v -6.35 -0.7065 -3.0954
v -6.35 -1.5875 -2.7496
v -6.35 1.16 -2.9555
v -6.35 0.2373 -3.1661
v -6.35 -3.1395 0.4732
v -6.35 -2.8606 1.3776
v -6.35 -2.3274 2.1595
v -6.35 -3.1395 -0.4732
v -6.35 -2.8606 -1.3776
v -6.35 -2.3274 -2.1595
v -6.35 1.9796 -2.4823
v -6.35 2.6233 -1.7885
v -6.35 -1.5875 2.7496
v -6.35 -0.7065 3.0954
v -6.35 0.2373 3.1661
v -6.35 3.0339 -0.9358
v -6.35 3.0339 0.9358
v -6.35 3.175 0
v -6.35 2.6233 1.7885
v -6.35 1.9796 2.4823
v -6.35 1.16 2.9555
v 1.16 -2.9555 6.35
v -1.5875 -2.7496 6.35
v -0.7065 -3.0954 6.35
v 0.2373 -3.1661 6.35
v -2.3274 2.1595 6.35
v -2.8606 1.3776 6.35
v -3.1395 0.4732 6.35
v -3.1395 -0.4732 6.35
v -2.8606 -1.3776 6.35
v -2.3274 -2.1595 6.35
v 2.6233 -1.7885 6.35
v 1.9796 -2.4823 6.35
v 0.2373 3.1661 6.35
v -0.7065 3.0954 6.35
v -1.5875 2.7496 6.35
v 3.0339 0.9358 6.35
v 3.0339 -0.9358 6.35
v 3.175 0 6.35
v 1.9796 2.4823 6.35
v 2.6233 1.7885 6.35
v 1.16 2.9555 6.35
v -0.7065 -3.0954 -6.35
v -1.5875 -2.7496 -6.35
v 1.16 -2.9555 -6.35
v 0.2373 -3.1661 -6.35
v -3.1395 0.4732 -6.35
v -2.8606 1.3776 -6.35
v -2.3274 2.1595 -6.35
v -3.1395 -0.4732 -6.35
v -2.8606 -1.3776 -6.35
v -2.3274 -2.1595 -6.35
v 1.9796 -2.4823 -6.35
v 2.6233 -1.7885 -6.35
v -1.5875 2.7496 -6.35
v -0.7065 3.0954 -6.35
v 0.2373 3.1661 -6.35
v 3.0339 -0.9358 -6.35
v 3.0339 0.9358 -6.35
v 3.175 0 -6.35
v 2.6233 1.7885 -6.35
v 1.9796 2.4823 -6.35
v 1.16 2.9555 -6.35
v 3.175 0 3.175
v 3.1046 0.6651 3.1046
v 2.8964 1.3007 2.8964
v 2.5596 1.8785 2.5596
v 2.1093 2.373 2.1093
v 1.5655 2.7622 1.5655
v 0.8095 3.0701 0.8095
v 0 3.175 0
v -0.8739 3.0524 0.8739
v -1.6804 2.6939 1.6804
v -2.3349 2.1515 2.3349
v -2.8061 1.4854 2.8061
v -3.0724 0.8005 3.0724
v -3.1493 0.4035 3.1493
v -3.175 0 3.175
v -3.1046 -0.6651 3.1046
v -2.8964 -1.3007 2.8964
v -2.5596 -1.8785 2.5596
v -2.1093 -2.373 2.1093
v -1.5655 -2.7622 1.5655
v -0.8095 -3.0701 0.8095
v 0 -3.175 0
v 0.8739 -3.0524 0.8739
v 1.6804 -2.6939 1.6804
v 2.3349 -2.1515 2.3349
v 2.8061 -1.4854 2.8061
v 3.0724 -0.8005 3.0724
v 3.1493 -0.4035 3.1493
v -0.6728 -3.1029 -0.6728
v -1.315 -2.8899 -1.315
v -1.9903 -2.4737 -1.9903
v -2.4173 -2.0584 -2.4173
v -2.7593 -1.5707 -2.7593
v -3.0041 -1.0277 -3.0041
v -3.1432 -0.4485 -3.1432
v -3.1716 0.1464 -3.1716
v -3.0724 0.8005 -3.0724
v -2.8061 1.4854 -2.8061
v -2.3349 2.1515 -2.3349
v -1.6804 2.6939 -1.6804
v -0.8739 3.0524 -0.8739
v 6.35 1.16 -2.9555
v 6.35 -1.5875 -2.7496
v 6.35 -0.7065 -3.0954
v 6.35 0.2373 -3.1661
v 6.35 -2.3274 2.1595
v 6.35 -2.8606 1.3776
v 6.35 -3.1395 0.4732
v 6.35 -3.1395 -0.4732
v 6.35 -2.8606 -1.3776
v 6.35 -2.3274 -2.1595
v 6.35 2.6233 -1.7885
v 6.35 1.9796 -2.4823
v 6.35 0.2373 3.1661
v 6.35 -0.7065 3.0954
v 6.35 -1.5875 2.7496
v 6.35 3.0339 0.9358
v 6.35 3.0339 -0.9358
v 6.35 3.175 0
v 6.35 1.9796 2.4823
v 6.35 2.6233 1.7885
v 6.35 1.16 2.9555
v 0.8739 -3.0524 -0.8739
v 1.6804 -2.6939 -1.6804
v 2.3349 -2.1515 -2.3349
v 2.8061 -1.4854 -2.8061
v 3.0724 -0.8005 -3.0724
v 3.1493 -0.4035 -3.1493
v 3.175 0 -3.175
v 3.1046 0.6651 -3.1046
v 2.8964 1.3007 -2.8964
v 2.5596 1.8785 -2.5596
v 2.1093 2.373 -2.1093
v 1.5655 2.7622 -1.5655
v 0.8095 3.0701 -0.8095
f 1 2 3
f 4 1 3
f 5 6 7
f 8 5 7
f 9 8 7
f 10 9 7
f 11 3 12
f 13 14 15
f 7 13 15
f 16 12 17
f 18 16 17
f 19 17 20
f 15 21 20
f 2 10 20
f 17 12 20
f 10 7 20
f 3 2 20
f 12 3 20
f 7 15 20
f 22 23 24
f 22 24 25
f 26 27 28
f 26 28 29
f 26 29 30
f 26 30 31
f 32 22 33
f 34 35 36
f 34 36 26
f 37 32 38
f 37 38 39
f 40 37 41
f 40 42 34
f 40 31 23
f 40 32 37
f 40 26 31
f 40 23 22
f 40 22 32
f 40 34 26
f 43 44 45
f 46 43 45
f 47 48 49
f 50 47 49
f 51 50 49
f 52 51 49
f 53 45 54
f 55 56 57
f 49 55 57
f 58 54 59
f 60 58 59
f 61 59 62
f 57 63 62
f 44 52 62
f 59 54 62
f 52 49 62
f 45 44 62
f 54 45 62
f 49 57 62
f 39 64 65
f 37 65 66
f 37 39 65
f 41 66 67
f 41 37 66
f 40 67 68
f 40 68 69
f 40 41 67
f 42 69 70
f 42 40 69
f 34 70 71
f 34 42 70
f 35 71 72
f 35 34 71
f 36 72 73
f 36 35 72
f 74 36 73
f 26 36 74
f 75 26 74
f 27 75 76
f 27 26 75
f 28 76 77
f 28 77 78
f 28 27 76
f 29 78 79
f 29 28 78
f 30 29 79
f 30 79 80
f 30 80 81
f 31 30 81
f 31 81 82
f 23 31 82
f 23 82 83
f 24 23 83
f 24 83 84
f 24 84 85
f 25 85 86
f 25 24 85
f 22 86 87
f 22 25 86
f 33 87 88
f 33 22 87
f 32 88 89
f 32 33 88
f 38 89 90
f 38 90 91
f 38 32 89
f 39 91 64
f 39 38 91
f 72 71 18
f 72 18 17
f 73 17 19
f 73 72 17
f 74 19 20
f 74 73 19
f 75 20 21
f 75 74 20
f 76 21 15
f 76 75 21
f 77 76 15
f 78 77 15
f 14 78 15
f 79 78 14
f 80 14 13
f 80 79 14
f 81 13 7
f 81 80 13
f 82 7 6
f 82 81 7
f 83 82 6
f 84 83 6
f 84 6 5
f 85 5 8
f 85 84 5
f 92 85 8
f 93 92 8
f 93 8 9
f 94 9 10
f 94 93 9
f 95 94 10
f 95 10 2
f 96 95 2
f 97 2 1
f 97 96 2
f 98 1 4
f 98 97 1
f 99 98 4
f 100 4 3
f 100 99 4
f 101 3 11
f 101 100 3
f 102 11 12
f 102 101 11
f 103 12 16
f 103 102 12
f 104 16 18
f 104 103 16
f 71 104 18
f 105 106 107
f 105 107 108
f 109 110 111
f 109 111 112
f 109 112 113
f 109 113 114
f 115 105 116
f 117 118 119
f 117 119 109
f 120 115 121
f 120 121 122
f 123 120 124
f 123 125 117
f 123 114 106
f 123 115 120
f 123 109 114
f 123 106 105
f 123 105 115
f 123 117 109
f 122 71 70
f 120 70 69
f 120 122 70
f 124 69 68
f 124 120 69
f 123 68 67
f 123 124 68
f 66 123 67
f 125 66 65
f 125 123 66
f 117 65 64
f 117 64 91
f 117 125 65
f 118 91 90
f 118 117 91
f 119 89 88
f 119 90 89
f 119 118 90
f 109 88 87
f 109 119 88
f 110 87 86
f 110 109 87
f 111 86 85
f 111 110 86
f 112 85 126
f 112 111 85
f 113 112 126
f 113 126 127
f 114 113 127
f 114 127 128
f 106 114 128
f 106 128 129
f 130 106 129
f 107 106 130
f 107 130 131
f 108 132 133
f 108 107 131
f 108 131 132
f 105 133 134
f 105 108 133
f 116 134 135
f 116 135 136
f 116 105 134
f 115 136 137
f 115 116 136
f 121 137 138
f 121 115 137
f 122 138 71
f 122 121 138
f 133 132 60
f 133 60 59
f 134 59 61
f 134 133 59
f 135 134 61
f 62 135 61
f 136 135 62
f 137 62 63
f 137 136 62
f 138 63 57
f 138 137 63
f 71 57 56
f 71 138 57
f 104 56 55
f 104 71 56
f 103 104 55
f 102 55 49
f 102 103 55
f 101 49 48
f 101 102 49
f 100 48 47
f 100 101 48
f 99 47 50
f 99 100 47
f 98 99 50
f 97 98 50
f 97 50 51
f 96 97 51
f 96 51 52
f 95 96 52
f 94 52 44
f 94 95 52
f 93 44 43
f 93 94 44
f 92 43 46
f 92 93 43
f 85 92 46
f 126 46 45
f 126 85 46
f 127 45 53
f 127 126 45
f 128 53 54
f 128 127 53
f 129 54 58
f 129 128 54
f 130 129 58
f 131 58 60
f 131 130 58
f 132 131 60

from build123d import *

# Parameters (mm, degrees)
F0_R     = 3.175
F1_DEPTH = 6.35
F2_R     = 3.175
F3_DEPTH = 6.35


with BuildPart() as f1:
    # F0 (on Top) → F1 (new body, symmetric)
    with BuildSketch(Plane.XY):
        Circle(F0_R)
    extrude(amount=F1_DEPTH, both=True)

    # F2 (on Right) → F3 (join, symmetric)
    with BuildSketch(Plane.YZ):
        Circle(F2_R)
    extrude(amount=F3_DEPTH, both=True)


solid = f1.part
